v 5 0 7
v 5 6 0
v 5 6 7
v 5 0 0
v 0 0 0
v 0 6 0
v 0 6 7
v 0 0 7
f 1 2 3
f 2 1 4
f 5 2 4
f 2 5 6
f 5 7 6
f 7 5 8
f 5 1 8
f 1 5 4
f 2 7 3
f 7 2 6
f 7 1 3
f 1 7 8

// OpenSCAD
translate([2.5, 1.5, 1.0]) color([0.6805891325622565, 0.026696794662205203, 0.6349999099114583]) cube([5, 3, 2], center=true);
translate([2.5, 4.5, 1.0]) color([0.6063384177542189, 0.5759529480315407, 0.3912094093228269]) cube([5, 3, 2], center=true);
translate([2.5, 1.0, 3.5]) color([0.3701399403351875, 0.9805166506472687, 0.036392037611485795]) cube([5, 2, 3], center=true);
translate([2.5, 3.0, 3.5]) color([0.021636509855024078, 0.9610312802396112, 0.18497194139743833]) cube([5, 2, 3], center=true);
translate([2.5, 5.0, 3.5]) color([0.12389516442443171, 0.21057650988664645, 0.8007465903541809]) cube([5, 2, 3], center=true);
translate([2.5, 1.5, 6.0]) color([0.9369691586445807, 0.022782575668658378, 0.42561883196681716]) cube([5, 3, 2], center=true);
translate([2.5, 4.5, 6.0]) color([0.10150021937416975, 0.259919889792832, 0.22082927131631735]) cube([5, 3, 2], center=true);
